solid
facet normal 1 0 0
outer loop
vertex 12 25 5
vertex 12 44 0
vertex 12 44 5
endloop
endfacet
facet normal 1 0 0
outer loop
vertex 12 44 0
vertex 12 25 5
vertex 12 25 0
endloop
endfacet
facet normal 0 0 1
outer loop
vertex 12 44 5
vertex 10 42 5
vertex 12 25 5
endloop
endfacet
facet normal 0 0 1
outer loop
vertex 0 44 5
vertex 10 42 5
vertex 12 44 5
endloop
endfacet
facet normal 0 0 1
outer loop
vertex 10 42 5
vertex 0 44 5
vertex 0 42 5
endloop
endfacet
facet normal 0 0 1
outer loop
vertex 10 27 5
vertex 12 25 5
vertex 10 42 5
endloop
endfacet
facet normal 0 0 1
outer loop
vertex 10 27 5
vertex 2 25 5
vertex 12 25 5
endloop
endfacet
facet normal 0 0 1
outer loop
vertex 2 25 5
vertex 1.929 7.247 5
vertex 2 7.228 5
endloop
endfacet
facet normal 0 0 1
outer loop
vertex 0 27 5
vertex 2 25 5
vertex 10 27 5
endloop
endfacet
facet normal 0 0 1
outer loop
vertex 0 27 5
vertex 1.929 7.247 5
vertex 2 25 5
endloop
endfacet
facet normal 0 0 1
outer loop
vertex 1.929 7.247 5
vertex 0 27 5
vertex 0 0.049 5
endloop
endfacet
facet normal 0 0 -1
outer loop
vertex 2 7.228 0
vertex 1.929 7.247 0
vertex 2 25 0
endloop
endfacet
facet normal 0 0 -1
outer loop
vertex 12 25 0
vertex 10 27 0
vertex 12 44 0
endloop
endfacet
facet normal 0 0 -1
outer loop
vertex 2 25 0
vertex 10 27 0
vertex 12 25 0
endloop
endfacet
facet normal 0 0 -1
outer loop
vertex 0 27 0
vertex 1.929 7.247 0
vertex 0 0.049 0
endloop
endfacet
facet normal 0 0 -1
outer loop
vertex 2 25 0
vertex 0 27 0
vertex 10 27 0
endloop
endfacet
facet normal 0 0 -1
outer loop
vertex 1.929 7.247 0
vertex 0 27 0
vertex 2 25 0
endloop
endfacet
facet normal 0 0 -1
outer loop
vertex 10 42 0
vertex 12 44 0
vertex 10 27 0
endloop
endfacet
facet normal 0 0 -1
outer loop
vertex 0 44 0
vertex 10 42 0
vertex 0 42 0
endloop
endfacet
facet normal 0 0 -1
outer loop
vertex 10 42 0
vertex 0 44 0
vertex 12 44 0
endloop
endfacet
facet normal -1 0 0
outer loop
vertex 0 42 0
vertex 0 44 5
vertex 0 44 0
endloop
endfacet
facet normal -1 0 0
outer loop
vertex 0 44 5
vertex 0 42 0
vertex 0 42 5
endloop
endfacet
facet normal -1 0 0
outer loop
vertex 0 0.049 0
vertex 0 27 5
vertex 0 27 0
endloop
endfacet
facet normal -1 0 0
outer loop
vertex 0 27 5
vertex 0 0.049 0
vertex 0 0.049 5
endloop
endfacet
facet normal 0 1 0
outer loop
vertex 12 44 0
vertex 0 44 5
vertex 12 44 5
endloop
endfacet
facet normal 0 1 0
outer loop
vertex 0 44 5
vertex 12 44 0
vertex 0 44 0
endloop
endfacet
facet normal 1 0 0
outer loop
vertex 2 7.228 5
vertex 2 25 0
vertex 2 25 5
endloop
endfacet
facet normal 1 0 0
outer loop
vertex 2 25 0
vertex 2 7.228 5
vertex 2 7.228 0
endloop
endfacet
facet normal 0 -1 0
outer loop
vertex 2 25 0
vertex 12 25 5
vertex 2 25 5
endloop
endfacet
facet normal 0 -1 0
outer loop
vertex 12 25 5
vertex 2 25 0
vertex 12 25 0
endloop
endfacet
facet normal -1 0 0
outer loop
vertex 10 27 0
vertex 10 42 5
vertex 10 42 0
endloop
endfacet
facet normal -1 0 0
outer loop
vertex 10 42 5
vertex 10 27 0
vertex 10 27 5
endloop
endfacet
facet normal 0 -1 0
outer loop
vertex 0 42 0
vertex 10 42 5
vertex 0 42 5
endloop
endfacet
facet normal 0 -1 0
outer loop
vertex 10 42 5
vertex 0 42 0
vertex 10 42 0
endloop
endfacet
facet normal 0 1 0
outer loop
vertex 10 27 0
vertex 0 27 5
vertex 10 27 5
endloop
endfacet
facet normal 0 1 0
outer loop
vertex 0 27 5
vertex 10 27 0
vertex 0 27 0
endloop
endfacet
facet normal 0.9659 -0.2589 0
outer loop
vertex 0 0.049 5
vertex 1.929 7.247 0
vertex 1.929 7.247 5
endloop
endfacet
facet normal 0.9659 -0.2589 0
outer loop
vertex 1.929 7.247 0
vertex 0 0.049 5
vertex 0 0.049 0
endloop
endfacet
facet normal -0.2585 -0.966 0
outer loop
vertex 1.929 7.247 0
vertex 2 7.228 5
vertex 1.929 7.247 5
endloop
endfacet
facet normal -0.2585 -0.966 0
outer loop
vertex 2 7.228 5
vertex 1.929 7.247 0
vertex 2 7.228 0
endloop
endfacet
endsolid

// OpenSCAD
//cylinder(h = height, r1 = BottomRadius, r2 = TopRadius, center = true/false);

width=2;
cableHeight=15;
cablewidth=10;
holderLength=25;

weight=5;

//cube(size = [x,y,z], center = true/false);

difference() {
    cube(size = [width+cablewidth,holderLength+cableHeight+width*2,weight]);
    translate([width,0,0]) cube(size = [width+cablewidth,holderLength,weight]);
    translate([0,width+holderLength,0]) cube(size = [cablewidth,cableHeight,weight]);
    translate([9,-5,0]) rotate([0,0,75]) cube(size = [10,10,weight]);
}
